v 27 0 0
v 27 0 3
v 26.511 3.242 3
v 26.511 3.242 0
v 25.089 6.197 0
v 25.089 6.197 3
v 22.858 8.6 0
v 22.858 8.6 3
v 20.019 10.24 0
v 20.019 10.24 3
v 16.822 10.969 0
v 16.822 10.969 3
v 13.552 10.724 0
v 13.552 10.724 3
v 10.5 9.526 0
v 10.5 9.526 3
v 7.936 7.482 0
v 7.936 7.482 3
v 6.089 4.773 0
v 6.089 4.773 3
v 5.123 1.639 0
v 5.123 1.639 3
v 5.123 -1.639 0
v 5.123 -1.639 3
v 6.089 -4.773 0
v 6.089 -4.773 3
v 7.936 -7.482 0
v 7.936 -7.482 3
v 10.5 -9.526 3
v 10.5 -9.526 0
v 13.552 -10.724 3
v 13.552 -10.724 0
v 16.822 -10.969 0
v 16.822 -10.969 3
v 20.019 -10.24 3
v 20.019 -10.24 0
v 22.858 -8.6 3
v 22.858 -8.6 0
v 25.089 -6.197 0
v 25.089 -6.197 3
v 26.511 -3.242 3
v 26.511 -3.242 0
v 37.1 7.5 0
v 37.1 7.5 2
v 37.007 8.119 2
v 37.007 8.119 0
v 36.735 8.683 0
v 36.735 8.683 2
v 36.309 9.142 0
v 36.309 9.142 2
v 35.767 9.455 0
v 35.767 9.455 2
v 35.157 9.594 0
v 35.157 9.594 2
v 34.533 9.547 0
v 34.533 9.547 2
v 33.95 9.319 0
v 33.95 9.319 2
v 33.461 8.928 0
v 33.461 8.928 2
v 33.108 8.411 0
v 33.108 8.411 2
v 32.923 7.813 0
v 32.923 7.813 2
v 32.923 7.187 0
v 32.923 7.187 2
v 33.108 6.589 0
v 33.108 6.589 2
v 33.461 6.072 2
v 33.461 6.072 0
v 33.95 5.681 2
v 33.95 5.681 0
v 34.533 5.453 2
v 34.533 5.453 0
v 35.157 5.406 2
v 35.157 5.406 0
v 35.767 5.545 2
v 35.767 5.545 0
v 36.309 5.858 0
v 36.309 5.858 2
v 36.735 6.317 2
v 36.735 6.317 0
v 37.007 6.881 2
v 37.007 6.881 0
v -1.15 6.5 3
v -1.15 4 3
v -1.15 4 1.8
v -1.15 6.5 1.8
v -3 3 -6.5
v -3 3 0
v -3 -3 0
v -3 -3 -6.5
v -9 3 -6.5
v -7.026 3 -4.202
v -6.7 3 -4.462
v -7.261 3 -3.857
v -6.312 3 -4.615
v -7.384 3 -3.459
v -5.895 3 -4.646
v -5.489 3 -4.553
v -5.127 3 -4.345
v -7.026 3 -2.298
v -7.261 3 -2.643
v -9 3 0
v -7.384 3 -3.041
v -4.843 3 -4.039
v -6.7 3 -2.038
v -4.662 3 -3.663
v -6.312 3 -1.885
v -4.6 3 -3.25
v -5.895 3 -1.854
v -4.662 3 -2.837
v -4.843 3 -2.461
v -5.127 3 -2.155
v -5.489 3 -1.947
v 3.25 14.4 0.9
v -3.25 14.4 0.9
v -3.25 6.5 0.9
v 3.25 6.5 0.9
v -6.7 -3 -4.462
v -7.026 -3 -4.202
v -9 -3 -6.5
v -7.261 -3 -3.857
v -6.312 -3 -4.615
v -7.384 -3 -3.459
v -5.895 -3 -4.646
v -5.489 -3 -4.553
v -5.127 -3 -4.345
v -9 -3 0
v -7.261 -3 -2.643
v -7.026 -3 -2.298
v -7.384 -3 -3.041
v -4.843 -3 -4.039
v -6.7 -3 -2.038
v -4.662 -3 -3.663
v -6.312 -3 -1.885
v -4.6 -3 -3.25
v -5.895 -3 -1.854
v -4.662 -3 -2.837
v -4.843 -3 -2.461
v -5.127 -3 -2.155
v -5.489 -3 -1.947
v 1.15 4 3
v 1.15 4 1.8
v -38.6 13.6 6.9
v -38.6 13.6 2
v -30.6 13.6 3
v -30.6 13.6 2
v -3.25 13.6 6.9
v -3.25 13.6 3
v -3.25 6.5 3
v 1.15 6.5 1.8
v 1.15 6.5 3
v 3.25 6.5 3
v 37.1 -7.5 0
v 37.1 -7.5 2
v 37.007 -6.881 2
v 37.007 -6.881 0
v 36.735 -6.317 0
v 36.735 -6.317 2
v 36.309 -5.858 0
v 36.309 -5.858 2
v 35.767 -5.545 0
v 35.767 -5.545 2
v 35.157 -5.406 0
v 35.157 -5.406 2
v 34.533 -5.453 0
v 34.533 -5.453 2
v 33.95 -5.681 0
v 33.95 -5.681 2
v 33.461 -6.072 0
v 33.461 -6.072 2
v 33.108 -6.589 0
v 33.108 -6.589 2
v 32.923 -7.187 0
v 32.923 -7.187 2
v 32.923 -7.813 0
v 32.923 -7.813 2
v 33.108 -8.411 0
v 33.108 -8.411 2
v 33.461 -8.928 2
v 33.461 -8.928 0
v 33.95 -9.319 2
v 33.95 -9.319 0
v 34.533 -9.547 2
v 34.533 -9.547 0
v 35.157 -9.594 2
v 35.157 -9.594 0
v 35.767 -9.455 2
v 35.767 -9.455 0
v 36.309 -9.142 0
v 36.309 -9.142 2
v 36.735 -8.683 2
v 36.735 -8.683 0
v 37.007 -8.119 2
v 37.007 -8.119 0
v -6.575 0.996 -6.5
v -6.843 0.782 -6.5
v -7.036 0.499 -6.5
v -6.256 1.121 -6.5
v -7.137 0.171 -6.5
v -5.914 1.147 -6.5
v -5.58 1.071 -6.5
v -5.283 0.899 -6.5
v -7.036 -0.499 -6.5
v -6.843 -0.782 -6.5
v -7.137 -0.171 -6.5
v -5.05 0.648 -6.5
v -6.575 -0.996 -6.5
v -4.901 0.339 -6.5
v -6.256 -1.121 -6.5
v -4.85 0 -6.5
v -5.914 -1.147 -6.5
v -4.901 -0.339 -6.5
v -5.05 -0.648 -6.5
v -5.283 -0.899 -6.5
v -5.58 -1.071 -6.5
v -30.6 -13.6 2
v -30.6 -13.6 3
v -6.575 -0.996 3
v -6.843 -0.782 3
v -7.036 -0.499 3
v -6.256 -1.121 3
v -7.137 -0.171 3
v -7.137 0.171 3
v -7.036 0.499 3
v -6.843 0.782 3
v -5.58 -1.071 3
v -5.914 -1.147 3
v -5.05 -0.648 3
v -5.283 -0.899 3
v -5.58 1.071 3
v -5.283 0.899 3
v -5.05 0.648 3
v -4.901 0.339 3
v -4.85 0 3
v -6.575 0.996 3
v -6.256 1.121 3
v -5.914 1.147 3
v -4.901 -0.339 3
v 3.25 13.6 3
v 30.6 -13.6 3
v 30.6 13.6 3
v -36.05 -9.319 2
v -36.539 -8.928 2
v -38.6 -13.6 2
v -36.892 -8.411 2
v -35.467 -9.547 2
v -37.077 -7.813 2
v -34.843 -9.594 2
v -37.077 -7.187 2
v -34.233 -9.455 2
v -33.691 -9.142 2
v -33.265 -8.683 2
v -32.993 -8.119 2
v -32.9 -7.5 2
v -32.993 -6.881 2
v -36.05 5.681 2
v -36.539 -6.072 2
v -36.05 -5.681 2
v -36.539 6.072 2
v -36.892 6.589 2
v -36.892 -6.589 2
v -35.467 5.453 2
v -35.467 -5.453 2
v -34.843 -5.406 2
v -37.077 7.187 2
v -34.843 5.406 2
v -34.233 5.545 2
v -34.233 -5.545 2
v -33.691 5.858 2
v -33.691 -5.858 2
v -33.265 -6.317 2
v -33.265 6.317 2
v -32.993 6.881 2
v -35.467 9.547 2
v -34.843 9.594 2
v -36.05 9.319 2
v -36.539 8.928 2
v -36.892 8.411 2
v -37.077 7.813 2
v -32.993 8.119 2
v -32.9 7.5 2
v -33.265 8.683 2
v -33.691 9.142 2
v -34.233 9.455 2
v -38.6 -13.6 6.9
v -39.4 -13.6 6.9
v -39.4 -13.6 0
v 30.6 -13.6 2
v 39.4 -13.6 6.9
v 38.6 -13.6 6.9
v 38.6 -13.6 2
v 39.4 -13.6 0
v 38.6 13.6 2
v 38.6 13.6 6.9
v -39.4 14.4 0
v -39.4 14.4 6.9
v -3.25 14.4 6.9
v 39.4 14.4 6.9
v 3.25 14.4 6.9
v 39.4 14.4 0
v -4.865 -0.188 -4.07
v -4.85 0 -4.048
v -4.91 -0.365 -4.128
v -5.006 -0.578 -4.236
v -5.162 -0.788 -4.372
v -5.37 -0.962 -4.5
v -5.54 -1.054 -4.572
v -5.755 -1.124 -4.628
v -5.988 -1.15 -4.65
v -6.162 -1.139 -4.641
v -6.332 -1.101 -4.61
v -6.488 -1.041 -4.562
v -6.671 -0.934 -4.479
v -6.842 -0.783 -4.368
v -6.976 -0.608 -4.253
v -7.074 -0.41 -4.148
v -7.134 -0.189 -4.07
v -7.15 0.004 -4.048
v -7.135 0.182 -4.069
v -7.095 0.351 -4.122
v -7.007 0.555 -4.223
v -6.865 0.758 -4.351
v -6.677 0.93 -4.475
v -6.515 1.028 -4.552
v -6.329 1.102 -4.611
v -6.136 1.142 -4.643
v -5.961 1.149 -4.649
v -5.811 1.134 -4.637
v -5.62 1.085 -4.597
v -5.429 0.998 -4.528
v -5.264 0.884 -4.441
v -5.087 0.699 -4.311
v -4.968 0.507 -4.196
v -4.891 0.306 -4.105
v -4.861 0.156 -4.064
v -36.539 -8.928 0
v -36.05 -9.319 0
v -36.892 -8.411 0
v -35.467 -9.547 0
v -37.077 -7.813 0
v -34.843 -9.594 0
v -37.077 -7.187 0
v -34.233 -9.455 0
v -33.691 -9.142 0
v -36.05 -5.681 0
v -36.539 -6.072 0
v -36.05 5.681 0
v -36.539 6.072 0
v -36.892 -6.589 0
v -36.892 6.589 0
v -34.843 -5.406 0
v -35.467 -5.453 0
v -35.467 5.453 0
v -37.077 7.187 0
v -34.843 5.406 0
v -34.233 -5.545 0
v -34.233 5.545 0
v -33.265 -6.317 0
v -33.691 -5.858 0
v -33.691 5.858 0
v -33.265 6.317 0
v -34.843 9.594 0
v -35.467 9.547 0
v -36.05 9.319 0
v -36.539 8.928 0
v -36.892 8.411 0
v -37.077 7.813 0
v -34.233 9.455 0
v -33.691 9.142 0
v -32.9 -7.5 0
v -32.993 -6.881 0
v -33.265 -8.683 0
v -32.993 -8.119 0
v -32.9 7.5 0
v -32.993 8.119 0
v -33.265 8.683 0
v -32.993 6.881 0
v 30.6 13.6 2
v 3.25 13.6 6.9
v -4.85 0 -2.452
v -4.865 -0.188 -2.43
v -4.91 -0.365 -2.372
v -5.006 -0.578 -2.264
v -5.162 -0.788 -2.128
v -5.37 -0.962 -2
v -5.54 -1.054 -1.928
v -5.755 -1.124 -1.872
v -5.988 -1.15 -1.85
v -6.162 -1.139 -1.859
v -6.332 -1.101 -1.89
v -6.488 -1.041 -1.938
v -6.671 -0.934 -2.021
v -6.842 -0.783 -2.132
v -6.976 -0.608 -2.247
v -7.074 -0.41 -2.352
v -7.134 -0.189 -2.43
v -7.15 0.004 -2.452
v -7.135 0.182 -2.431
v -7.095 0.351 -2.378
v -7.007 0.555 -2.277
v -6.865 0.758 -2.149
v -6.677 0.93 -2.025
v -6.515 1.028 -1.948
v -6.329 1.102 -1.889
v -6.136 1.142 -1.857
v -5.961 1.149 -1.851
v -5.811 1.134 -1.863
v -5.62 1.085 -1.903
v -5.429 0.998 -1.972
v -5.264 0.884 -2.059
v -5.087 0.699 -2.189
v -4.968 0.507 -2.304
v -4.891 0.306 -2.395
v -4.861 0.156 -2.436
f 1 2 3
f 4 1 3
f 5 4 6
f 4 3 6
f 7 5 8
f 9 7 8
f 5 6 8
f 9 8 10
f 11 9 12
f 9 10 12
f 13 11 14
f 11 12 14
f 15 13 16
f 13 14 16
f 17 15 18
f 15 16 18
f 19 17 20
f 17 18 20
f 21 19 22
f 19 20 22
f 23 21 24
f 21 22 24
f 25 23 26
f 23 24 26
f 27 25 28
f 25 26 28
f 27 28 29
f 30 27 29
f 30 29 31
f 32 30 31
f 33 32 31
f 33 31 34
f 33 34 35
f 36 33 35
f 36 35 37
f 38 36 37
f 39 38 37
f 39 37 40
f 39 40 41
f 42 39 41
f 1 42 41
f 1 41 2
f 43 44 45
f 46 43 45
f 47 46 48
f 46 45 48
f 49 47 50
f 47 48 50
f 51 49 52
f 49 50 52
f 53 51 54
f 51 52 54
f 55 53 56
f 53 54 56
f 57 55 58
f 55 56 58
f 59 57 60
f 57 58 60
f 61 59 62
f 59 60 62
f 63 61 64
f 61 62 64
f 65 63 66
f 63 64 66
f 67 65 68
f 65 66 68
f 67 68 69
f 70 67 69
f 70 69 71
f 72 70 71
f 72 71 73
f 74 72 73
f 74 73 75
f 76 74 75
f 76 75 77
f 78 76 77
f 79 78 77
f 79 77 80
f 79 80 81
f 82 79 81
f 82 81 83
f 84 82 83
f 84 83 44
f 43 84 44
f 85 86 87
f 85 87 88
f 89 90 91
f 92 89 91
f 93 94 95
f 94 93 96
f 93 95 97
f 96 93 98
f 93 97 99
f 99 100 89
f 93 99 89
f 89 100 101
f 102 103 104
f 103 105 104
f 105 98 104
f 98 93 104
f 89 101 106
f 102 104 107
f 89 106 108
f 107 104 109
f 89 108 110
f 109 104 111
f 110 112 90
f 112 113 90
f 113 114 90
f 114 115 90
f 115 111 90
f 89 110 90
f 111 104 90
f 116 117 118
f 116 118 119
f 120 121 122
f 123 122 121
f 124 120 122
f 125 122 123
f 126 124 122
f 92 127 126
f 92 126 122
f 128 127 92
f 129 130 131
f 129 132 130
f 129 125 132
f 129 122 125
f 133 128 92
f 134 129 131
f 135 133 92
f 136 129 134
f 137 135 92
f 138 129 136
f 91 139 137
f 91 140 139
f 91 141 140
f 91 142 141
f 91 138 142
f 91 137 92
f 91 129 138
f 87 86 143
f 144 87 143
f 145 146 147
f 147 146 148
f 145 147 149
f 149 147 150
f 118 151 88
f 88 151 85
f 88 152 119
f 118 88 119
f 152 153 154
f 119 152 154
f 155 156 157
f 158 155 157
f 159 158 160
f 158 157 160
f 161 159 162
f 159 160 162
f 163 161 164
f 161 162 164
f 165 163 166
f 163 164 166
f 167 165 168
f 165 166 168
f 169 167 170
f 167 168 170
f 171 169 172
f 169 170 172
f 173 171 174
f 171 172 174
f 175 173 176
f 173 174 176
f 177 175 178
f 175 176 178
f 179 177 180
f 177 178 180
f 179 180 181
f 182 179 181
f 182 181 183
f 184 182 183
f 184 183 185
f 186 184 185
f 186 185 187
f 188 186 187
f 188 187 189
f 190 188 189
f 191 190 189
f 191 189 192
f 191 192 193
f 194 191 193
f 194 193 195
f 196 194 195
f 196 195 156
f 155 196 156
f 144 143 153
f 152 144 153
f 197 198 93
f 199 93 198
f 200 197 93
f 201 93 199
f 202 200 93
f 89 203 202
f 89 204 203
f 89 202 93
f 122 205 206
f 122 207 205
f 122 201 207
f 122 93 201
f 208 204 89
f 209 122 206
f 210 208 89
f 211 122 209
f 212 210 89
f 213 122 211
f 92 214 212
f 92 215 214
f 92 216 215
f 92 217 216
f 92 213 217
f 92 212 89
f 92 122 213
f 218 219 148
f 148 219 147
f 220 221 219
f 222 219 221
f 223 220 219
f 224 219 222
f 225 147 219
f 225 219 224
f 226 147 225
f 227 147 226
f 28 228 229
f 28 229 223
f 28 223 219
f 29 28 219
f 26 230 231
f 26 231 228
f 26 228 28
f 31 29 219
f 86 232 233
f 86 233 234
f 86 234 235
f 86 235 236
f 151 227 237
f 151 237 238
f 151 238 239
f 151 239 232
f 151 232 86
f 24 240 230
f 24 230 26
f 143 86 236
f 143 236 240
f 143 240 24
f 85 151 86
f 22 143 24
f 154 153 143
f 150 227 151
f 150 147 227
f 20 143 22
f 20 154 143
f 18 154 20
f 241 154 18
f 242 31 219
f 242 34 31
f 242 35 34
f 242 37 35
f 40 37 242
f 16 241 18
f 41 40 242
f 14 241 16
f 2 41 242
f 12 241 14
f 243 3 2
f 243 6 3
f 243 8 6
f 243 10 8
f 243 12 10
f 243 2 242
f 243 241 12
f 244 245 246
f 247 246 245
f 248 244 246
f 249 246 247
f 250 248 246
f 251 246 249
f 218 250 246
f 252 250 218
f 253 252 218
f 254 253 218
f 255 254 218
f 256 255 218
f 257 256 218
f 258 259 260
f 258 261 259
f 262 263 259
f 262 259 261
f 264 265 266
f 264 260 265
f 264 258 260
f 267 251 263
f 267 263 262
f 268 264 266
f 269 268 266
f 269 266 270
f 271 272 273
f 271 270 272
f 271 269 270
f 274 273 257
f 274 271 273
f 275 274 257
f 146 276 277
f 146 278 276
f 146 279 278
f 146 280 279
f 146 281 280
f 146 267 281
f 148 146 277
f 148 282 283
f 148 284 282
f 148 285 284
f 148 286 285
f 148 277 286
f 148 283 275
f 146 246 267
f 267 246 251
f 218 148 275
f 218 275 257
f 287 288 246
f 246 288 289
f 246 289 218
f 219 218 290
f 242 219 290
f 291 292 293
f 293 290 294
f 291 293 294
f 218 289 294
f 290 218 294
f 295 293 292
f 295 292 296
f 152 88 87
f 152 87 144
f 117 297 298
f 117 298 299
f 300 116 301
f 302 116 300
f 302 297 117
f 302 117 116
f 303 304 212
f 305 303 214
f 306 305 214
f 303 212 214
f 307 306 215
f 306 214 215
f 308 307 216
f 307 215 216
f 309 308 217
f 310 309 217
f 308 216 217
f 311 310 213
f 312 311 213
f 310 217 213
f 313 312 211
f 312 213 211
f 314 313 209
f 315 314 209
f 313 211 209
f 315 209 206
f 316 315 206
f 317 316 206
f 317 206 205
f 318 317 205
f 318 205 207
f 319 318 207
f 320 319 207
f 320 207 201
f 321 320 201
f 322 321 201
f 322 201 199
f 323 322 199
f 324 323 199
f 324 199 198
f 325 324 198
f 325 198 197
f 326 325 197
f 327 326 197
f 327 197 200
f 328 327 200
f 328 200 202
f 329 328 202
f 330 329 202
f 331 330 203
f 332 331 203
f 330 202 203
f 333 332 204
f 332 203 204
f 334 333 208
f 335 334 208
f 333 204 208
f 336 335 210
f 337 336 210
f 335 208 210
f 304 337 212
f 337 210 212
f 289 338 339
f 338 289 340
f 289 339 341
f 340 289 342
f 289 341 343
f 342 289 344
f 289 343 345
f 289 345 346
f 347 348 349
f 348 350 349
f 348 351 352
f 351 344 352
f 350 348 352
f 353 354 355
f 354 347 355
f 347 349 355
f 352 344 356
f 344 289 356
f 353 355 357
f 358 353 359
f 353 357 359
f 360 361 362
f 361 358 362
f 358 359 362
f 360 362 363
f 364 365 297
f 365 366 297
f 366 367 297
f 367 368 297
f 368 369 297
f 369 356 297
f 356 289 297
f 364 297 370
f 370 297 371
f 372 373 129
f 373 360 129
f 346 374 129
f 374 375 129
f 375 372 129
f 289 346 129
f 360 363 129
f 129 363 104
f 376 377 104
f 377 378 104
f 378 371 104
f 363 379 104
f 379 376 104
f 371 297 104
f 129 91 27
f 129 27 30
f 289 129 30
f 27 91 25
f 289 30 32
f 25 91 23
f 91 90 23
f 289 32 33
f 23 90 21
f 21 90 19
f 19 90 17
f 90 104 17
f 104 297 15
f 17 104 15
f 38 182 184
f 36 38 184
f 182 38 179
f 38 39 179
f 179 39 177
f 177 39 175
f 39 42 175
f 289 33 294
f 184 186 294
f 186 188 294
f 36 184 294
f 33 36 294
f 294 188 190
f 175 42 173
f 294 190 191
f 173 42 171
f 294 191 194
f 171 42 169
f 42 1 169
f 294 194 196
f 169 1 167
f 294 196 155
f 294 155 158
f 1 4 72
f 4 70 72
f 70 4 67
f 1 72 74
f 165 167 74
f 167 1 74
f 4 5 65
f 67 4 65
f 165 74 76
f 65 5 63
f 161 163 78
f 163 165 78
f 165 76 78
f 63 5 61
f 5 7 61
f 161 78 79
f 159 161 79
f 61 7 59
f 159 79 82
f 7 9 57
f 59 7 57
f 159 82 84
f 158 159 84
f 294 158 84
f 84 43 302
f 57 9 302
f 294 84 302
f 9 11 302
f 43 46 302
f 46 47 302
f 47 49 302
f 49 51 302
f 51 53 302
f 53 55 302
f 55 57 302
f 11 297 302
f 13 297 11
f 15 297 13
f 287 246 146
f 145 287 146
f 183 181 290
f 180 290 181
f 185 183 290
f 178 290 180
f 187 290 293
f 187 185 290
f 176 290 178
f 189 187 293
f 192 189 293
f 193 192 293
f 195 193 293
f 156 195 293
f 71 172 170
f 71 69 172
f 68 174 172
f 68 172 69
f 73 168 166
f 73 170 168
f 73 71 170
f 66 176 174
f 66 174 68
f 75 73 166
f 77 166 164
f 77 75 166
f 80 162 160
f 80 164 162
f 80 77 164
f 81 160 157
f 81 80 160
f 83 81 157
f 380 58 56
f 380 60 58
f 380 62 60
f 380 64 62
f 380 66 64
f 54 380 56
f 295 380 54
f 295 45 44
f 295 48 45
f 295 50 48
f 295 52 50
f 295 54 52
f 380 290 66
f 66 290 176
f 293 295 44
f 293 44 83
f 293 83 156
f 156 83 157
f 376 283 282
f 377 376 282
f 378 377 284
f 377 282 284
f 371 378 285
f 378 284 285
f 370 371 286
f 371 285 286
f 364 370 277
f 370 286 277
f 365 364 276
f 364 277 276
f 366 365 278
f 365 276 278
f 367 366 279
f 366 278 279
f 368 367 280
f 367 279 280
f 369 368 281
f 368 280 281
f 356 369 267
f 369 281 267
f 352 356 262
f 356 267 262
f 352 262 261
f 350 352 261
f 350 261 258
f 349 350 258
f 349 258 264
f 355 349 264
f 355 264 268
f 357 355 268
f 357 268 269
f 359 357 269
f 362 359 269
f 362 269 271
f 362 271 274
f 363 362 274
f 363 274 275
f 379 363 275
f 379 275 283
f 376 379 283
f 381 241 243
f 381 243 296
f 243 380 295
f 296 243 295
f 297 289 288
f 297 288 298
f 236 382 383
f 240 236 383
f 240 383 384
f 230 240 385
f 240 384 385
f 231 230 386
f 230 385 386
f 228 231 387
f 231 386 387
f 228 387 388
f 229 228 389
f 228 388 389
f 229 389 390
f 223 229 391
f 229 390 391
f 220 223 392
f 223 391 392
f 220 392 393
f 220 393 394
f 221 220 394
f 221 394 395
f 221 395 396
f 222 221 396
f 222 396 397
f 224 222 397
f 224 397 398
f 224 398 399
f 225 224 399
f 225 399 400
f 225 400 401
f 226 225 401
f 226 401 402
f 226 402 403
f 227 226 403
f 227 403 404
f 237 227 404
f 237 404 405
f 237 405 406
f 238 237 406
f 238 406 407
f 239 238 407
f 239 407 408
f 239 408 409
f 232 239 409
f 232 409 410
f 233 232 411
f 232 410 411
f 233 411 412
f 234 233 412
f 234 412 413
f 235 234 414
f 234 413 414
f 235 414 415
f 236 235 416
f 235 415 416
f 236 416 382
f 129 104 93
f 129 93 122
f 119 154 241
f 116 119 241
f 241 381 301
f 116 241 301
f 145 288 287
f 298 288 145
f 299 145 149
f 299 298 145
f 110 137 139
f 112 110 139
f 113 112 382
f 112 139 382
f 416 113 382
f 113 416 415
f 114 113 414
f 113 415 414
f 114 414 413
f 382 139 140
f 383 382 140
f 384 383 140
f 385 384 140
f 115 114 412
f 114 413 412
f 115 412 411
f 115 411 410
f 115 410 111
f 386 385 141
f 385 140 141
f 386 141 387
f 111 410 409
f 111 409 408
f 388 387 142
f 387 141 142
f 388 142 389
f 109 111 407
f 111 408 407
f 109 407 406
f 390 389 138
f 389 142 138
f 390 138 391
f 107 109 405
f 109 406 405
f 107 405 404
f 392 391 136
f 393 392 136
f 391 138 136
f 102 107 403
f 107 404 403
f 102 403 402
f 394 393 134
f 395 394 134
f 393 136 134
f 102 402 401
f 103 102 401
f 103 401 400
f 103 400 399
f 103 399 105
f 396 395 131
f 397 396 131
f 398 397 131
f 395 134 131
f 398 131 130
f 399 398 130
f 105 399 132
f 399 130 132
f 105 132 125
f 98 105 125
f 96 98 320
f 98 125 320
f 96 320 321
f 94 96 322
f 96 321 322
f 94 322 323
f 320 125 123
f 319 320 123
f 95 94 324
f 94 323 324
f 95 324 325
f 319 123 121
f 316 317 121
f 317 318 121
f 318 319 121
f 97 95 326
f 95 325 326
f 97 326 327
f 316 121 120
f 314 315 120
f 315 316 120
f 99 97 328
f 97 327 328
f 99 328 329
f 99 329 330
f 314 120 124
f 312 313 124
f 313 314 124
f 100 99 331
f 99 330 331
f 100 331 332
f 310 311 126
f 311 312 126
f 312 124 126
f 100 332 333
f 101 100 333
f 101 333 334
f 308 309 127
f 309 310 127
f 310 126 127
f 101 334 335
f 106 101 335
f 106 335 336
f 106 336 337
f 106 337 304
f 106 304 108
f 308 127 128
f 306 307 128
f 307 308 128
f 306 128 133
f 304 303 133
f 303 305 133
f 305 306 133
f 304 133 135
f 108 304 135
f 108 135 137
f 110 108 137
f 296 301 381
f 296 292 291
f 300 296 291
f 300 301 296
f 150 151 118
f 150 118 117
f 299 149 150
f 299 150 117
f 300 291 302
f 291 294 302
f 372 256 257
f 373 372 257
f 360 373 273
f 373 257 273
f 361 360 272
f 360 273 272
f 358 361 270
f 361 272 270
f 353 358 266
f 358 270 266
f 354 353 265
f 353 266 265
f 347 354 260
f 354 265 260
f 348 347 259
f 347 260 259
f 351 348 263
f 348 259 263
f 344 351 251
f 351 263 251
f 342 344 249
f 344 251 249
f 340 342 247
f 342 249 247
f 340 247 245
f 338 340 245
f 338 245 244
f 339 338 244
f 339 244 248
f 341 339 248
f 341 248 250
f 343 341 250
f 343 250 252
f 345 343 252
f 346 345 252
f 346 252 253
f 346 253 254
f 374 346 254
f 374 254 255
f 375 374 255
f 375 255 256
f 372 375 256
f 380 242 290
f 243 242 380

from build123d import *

# Parameters (mm, degrees)
SKETCH_W        = 78.8
SKETCH_H        = 28
PAD_DEPTH       = 3
SKETCH001_R     = 11
POCKET_DEPTH    = 3.9
SKETCH002_W     = 0.8
SKETCH002_H     = 28
PAD001_DEPTH    = 3.9
SKETCH003_W     = 77.2
SKETCH003_H     = 0.8
PAD002_DEPTH    = 3.9
SKETCH004_W     = 8
SKETCH004_H     = 27.2
POCKET001_DEPTH = 1
SKETCH005_R     = 2.1
POCKET002_DEPTH = 5
SKETCH006_W     = 6
SKETCH006_H     = 6
PAD003_DEPTH    = 6.5
SKETCH007_R     = 1.15
POCKET003_DEPTH = 10
SKETCH008_R     = 1.4
POCKET004_DEPTH = 6
SKETCH009_W     = 2.3
SKETCH009_H     = 2.5
POCKET005_DEPTH = 1.2
SKETCH011_W     = 6.5
SKETCH011_H     = 8
POCKET006_DEPTH = 6


with BuildPart() as part:
    # Sketch → Pad (new body)
    with BuildSketch(Plane.XY):
        with Locations((0, 0.4)):
            Rectangle(SKETCH_W, SKETCH_H)
    extrude(amount=PAD_DEPTH)

    # Sketch001 (on Face6 of Pad) → Pocket (cut)
    with BuildSketch(Plane.XY.offset(3)):
        with Locations((16, 0)):
            Circle(SKETCH001_R)
    extrude(amount=-POCKET_DEPTH, mode=Mode.SUBTRACT)

    # Sketch002 (on Face5 of Pocket) → Pad001 (join)
    with BuildSketch(Plane.XY.offset(3)):
        with Locations((39, 0.4)):
            Rectangle(SKETCH002_W, SKETCH002_H)
        with Locations((-39, 0.4)):
            Rectangle(SKETCH002_W, SKETCH002_H)
    extrude(amount=PAD001_DEPTH)

    # Sketch003 (on Face6 of Pad001) → Pad002 (join)
    with BuildSketch(Plane.XY.offset(3)):
        with Locations((0, 14)):
            Rectangle(SKETCH003_W, SKETCH003_H)
    extrude(amount=PAD002_DEPTH)

    # Sketch004 (on Face16 of Pad002) → Pocket001 (cut)
    with BuildSketch(Plane.XY.offset(3)):
        with Locations((34.6, 0)):
            Rectangle(SKETCH004_W, SKETCH004_H)
        with Locations((-34.6, 0)):
            Rectangle(SKETCH004_W, SKETCH004_H)
    extrude(amount=-POCKET001_DEPTH, mode=Mode.SUBTRACT)

    # Sketch005 (on Face19 of Pocket001) → Pocket002 (cut)
    with BuildSketch(Plane.XY.offset(3)):
        with Locations((35, 7.5)):
            Circle(SKETCH005_R)
        with Locations((35, -7.5)):
            Circle(SKETCH005_R)
        with Locations((-35, 7.5)):
            Circle(SKETCH005_R)
        with Locations((-35, -7.5)):
            Circle(SKETCH005_R)
    extrude(amount=-POCKET002_DEPTH, mode=Mode.SUBTRACT)

    # Sketch006 (on Face4 of Pocket002) → Pad003 (join)
    with BuildSketch(Plane(origin=(0, 0, 0), x_dir=(1, 0, 0), z_dir=(0, 0, -1))):
        with Locations((-6, 0)):
            Rectangle(SKETCH006_W, SKETCH006_H)
    extrude(amount=PAD003_DEPTH)

    # Sketch007 (on Face32 of Pad003) → Pocket003 (cut)
    with BuildSketch(Plane(origin=(0, 0, -6.5), x_dir=(1, 0, 0), z_dir=(0, 0, -1))):
        with Locations((-6, 0)):
            Circle(SKETCH007_R)
    extrude(amount=-POCKET003_DEPTH, mode=Mode.SUBTRACT)

    # Sketch008 (on Face15 of Pocket003) → Pocket004 (cut)
    with BuildSketch(Plane.XZ.offset(3)):
        with Locations((-6, -3.25)):
            Circle(SKETCH008_R)
    extrude(amount=-POCKET004_DEPTH, mode=Mode.SUBTRACT)

    # Sketch009 (on Face27 of Pocket004) → Pocket005 (cut)
    with BuildSketch(Plane.XY.offset(3)):
        with Locations((0, 5.25)):
            Rectangle(SKETCH009_W, SKETCH009_H)
    extrude(amount=-POCKET005_DEPTH, mode=Mode.SUBTRACT)

    # Sketch011 (on Face21 of Pocket005) → Pocket006 (cut)
    with BuildSketch(Plane.XY.offset(6.9)):
        with Locations((0, 10.5)):
            Rectangle(SKETCH011_W, SKETCH011_H)
    extrude(amount=-POCKET006_DEPTH, mode=Mode.SUBTRACT)


solid = part.part
